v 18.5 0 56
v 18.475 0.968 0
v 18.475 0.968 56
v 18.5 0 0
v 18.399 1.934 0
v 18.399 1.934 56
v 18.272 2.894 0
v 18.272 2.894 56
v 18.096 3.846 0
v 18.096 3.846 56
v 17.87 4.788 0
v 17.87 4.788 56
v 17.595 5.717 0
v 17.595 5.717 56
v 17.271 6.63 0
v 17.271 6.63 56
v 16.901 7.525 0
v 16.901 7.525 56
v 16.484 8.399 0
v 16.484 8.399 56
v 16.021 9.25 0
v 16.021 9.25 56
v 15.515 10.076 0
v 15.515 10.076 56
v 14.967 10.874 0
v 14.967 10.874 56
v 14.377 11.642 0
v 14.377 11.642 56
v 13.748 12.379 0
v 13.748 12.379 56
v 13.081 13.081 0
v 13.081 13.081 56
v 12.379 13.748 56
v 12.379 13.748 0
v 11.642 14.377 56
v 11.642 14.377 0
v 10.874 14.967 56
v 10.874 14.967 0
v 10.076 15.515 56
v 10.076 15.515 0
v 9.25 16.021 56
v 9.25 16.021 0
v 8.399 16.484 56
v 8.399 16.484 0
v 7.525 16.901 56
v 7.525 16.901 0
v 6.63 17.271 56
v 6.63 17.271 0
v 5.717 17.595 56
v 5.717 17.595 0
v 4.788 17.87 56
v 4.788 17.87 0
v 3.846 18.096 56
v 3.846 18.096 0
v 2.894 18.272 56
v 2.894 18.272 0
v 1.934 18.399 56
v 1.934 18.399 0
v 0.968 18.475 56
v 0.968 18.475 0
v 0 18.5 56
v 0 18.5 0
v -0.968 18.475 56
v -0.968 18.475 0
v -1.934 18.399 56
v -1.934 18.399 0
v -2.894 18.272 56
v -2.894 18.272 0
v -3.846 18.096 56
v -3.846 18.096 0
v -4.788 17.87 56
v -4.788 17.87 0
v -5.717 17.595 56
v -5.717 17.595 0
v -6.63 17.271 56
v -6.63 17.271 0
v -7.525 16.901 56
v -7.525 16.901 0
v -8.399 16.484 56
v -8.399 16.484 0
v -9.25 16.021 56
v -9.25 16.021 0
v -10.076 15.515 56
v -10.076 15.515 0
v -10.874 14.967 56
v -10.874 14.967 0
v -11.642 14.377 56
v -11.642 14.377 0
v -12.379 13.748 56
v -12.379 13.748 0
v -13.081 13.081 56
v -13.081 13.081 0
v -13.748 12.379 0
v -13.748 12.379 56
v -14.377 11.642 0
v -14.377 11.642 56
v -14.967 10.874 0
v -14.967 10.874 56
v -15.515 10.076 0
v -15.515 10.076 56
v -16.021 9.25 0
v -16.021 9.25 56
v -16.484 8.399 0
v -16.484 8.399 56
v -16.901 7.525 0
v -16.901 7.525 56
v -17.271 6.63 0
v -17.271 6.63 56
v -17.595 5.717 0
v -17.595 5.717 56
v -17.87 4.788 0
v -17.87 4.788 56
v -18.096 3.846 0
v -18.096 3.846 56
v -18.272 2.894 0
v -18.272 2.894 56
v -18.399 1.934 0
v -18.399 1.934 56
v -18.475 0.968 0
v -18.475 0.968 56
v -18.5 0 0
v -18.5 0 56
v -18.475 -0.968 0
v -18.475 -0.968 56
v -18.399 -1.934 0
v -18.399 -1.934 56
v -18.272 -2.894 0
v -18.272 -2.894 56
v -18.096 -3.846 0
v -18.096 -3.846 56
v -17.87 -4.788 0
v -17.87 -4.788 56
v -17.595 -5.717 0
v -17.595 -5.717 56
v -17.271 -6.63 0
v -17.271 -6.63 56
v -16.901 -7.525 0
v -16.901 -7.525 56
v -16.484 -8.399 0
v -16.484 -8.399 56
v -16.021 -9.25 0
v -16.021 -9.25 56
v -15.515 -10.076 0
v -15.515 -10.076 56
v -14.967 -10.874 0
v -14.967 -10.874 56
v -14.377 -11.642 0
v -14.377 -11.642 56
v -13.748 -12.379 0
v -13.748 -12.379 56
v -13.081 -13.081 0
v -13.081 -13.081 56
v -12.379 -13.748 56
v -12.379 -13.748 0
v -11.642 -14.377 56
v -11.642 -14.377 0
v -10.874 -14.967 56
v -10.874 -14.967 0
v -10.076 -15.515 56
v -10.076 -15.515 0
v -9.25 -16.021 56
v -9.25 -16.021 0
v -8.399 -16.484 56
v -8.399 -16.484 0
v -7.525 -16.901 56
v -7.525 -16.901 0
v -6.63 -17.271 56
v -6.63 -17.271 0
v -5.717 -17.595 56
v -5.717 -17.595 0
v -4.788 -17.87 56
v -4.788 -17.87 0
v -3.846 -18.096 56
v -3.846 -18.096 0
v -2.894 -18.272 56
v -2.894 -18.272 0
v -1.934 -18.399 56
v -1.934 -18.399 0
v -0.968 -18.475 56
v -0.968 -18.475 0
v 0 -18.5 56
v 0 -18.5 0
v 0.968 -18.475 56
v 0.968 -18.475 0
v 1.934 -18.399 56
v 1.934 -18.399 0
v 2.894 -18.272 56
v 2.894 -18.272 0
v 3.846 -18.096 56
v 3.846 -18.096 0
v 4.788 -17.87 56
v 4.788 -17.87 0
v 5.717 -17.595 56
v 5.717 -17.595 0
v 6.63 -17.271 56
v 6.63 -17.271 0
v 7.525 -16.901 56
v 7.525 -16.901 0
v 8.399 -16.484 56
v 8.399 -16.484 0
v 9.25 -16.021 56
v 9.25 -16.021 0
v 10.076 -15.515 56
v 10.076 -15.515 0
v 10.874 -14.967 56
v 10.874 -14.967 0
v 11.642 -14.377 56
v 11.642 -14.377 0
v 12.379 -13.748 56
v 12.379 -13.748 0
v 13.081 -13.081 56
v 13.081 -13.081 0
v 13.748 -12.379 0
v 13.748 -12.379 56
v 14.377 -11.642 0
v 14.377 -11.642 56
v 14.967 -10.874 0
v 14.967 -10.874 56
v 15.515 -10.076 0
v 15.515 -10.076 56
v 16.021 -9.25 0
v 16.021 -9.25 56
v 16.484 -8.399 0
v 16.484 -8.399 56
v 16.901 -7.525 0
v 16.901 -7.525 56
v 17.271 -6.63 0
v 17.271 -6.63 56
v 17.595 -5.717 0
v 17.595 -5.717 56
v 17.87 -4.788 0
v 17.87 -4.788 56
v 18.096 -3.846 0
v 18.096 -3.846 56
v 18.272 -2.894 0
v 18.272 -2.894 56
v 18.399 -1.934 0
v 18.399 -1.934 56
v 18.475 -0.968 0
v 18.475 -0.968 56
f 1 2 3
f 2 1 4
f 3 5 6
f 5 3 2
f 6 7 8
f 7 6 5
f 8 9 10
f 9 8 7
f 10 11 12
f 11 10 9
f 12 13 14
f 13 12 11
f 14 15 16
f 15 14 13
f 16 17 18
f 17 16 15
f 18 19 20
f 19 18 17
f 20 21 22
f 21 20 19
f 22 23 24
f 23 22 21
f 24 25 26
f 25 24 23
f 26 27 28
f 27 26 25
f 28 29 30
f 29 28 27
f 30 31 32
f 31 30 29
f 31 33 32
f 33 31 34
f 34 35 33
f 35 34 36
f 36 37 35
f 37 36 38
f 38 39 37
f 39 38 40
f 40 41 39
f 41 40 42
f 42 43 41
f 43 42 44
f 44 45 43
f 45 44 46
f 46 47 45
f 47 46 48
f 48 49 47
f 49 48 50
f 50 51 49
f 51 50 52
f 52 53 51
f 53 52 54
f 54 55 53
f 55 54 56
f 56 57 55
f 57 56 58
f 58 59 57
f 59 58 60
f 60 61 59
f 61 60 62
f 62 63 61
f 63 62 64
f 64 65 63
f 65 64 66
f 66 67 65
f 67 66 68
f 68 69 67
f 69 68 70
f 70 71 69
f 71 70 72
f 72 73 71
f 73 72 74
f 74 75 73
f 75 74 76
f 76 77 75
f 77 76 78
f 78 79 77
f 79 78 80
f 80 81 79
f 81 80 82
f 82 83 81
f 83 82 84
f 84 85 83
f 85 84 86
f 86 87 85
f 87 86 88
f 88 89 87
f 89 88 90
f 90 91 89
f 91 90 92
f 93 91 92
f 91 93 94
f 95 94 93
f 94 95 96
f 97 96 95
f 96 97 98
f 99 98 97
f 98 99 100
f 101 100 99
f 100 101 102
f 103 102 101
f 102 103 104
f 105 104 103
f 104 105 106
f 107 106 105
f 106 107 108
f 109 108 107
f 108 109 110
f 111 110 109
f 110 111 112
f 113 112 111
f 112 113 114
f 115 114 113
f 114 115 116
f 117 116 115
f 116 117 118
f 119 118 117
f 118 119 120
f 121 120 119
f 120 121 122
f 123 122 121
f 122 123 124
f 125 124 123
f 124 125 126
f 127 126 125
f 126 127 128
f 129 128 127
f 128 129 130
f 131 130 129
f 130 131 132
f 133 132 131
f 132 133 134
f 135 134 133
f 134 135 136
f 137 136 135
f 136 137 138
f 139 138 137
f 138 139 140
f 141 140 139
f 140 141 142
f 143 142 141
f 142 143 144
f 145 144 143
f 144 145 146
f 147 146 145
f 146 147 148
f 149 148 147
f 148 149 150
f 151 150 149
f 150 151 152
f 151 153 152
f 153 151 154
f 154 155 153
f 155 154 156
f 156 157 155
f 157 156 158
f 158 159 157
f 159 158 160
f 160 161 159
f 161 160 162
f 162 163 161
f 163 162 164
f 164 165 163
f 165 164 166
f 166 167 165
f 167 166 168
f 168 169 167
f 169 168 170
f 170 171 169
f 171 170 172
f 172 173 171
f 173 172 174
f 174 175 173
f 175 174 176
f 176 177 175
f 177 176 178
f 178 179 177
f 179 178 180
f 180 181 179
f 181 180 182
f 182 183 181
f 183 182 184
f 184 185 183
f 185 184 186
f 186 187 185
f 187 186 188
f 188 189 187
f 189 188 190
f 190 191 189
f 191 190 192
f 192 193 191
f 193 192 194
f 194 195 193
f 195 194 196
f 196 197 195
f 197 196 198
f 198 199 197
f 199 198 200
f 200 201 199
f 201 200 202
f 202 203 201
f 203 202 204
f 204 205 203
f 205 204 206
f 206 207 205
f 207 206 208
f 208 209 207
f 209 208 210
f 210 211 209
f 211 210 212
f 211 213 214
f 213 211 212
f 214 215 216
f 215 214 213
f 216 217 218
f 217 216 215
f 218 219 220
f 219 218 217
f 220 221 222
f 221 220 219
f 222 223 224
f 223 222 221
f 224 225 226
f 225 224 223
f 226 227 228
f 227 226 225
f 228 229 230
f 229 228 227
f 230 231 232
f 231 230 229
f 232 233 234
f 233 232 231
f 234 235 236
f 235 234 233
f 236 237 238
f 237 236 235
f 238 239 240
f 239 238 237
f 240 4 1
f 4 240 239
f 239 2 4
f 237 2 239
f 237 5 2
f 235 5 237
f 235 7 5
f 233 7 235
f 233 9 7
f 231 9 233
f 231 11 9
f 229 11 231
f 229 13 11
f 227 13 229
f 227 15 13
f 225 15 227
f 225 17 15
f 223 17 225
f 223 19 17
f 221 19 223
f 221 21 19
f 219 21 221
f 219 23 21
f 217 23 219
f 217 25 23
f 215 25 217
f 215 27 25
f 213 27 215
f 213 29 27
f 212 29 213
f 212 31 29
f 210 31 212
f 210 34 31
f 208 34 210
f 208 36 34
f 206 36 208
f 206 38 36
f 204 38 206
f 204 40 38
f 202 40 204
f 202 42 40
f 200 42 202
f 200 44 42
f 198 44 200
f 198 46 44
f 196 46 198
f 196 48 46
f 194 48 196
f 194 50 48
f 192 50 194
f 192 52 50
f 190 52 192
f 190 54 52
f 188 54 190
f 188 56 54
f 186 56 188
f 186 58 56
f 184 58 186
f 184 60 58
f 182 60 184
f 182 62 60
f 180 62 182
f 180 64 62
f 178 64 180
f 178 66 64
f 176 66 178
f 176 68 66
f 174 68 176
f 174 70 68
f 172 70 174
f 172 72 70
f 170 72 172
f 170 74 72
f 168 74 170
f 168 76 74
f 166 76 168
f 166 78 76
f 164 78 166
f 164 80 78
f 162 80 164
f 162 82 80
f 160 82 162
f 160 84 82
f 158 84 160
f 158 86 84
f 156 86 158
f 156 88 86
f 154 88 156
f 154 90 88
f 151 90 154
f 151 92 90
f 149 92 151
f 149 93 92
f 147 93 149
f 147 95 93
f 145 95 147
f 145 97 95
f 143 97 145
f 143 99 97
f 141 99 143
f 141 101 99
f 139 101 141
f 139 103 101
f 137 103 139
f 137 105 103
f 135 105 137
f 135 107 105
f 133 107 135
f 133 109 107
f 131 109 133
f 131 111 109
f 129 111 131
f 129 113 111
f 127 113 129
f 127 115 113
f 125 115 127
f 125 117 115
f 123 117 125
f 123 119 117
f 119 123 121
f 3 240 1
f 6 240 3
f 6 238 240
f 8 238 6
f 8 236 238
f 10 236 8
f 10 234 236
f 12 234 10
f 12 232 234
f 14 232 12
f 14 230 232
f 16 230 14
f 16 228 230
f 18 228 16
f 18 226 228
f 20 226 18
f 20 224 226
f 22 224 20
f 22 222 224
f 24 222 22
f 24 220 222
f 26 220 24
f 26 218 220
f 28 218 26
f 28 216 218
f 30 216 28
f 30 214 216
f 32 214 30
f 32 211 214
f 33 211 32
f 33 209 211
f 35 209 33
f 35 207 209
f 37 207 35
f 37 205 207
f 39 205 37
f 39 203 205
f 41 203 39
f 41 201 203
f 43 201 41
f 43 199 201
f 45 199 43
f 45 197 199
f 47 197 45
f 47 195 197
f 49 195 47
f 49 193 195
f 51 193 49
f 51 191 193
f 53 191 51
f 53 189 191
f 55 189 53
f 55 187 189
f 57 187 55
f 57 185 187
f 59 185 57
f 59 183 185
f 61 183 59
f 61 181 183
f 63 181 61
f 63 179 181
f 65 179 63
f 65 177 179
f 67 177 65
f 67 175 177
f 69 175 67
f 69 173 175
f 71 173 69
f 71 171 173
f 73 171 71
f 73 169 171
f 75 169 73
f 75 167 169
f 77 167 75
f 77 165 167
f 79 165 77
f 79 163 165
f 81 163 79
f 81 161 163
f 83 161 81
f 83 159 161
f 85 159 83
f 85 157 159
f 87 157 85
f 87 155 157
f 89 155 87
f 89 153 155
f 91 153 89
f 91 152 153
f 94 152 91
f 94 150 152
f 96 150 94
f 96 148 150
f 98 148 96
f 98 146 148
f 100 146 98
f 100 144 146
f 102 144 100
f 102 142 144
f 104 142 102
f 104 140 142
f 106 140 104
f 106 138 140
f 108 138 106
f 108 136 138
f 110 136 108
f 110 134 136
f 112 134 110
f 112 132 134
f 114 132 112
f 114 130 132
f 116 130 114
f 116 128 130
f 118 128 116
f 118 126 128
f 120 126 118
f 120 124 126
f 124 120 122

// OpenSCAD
height = 56;
r = (37 / 2);

cylinder(h = height, r = r, $fn = 120);
